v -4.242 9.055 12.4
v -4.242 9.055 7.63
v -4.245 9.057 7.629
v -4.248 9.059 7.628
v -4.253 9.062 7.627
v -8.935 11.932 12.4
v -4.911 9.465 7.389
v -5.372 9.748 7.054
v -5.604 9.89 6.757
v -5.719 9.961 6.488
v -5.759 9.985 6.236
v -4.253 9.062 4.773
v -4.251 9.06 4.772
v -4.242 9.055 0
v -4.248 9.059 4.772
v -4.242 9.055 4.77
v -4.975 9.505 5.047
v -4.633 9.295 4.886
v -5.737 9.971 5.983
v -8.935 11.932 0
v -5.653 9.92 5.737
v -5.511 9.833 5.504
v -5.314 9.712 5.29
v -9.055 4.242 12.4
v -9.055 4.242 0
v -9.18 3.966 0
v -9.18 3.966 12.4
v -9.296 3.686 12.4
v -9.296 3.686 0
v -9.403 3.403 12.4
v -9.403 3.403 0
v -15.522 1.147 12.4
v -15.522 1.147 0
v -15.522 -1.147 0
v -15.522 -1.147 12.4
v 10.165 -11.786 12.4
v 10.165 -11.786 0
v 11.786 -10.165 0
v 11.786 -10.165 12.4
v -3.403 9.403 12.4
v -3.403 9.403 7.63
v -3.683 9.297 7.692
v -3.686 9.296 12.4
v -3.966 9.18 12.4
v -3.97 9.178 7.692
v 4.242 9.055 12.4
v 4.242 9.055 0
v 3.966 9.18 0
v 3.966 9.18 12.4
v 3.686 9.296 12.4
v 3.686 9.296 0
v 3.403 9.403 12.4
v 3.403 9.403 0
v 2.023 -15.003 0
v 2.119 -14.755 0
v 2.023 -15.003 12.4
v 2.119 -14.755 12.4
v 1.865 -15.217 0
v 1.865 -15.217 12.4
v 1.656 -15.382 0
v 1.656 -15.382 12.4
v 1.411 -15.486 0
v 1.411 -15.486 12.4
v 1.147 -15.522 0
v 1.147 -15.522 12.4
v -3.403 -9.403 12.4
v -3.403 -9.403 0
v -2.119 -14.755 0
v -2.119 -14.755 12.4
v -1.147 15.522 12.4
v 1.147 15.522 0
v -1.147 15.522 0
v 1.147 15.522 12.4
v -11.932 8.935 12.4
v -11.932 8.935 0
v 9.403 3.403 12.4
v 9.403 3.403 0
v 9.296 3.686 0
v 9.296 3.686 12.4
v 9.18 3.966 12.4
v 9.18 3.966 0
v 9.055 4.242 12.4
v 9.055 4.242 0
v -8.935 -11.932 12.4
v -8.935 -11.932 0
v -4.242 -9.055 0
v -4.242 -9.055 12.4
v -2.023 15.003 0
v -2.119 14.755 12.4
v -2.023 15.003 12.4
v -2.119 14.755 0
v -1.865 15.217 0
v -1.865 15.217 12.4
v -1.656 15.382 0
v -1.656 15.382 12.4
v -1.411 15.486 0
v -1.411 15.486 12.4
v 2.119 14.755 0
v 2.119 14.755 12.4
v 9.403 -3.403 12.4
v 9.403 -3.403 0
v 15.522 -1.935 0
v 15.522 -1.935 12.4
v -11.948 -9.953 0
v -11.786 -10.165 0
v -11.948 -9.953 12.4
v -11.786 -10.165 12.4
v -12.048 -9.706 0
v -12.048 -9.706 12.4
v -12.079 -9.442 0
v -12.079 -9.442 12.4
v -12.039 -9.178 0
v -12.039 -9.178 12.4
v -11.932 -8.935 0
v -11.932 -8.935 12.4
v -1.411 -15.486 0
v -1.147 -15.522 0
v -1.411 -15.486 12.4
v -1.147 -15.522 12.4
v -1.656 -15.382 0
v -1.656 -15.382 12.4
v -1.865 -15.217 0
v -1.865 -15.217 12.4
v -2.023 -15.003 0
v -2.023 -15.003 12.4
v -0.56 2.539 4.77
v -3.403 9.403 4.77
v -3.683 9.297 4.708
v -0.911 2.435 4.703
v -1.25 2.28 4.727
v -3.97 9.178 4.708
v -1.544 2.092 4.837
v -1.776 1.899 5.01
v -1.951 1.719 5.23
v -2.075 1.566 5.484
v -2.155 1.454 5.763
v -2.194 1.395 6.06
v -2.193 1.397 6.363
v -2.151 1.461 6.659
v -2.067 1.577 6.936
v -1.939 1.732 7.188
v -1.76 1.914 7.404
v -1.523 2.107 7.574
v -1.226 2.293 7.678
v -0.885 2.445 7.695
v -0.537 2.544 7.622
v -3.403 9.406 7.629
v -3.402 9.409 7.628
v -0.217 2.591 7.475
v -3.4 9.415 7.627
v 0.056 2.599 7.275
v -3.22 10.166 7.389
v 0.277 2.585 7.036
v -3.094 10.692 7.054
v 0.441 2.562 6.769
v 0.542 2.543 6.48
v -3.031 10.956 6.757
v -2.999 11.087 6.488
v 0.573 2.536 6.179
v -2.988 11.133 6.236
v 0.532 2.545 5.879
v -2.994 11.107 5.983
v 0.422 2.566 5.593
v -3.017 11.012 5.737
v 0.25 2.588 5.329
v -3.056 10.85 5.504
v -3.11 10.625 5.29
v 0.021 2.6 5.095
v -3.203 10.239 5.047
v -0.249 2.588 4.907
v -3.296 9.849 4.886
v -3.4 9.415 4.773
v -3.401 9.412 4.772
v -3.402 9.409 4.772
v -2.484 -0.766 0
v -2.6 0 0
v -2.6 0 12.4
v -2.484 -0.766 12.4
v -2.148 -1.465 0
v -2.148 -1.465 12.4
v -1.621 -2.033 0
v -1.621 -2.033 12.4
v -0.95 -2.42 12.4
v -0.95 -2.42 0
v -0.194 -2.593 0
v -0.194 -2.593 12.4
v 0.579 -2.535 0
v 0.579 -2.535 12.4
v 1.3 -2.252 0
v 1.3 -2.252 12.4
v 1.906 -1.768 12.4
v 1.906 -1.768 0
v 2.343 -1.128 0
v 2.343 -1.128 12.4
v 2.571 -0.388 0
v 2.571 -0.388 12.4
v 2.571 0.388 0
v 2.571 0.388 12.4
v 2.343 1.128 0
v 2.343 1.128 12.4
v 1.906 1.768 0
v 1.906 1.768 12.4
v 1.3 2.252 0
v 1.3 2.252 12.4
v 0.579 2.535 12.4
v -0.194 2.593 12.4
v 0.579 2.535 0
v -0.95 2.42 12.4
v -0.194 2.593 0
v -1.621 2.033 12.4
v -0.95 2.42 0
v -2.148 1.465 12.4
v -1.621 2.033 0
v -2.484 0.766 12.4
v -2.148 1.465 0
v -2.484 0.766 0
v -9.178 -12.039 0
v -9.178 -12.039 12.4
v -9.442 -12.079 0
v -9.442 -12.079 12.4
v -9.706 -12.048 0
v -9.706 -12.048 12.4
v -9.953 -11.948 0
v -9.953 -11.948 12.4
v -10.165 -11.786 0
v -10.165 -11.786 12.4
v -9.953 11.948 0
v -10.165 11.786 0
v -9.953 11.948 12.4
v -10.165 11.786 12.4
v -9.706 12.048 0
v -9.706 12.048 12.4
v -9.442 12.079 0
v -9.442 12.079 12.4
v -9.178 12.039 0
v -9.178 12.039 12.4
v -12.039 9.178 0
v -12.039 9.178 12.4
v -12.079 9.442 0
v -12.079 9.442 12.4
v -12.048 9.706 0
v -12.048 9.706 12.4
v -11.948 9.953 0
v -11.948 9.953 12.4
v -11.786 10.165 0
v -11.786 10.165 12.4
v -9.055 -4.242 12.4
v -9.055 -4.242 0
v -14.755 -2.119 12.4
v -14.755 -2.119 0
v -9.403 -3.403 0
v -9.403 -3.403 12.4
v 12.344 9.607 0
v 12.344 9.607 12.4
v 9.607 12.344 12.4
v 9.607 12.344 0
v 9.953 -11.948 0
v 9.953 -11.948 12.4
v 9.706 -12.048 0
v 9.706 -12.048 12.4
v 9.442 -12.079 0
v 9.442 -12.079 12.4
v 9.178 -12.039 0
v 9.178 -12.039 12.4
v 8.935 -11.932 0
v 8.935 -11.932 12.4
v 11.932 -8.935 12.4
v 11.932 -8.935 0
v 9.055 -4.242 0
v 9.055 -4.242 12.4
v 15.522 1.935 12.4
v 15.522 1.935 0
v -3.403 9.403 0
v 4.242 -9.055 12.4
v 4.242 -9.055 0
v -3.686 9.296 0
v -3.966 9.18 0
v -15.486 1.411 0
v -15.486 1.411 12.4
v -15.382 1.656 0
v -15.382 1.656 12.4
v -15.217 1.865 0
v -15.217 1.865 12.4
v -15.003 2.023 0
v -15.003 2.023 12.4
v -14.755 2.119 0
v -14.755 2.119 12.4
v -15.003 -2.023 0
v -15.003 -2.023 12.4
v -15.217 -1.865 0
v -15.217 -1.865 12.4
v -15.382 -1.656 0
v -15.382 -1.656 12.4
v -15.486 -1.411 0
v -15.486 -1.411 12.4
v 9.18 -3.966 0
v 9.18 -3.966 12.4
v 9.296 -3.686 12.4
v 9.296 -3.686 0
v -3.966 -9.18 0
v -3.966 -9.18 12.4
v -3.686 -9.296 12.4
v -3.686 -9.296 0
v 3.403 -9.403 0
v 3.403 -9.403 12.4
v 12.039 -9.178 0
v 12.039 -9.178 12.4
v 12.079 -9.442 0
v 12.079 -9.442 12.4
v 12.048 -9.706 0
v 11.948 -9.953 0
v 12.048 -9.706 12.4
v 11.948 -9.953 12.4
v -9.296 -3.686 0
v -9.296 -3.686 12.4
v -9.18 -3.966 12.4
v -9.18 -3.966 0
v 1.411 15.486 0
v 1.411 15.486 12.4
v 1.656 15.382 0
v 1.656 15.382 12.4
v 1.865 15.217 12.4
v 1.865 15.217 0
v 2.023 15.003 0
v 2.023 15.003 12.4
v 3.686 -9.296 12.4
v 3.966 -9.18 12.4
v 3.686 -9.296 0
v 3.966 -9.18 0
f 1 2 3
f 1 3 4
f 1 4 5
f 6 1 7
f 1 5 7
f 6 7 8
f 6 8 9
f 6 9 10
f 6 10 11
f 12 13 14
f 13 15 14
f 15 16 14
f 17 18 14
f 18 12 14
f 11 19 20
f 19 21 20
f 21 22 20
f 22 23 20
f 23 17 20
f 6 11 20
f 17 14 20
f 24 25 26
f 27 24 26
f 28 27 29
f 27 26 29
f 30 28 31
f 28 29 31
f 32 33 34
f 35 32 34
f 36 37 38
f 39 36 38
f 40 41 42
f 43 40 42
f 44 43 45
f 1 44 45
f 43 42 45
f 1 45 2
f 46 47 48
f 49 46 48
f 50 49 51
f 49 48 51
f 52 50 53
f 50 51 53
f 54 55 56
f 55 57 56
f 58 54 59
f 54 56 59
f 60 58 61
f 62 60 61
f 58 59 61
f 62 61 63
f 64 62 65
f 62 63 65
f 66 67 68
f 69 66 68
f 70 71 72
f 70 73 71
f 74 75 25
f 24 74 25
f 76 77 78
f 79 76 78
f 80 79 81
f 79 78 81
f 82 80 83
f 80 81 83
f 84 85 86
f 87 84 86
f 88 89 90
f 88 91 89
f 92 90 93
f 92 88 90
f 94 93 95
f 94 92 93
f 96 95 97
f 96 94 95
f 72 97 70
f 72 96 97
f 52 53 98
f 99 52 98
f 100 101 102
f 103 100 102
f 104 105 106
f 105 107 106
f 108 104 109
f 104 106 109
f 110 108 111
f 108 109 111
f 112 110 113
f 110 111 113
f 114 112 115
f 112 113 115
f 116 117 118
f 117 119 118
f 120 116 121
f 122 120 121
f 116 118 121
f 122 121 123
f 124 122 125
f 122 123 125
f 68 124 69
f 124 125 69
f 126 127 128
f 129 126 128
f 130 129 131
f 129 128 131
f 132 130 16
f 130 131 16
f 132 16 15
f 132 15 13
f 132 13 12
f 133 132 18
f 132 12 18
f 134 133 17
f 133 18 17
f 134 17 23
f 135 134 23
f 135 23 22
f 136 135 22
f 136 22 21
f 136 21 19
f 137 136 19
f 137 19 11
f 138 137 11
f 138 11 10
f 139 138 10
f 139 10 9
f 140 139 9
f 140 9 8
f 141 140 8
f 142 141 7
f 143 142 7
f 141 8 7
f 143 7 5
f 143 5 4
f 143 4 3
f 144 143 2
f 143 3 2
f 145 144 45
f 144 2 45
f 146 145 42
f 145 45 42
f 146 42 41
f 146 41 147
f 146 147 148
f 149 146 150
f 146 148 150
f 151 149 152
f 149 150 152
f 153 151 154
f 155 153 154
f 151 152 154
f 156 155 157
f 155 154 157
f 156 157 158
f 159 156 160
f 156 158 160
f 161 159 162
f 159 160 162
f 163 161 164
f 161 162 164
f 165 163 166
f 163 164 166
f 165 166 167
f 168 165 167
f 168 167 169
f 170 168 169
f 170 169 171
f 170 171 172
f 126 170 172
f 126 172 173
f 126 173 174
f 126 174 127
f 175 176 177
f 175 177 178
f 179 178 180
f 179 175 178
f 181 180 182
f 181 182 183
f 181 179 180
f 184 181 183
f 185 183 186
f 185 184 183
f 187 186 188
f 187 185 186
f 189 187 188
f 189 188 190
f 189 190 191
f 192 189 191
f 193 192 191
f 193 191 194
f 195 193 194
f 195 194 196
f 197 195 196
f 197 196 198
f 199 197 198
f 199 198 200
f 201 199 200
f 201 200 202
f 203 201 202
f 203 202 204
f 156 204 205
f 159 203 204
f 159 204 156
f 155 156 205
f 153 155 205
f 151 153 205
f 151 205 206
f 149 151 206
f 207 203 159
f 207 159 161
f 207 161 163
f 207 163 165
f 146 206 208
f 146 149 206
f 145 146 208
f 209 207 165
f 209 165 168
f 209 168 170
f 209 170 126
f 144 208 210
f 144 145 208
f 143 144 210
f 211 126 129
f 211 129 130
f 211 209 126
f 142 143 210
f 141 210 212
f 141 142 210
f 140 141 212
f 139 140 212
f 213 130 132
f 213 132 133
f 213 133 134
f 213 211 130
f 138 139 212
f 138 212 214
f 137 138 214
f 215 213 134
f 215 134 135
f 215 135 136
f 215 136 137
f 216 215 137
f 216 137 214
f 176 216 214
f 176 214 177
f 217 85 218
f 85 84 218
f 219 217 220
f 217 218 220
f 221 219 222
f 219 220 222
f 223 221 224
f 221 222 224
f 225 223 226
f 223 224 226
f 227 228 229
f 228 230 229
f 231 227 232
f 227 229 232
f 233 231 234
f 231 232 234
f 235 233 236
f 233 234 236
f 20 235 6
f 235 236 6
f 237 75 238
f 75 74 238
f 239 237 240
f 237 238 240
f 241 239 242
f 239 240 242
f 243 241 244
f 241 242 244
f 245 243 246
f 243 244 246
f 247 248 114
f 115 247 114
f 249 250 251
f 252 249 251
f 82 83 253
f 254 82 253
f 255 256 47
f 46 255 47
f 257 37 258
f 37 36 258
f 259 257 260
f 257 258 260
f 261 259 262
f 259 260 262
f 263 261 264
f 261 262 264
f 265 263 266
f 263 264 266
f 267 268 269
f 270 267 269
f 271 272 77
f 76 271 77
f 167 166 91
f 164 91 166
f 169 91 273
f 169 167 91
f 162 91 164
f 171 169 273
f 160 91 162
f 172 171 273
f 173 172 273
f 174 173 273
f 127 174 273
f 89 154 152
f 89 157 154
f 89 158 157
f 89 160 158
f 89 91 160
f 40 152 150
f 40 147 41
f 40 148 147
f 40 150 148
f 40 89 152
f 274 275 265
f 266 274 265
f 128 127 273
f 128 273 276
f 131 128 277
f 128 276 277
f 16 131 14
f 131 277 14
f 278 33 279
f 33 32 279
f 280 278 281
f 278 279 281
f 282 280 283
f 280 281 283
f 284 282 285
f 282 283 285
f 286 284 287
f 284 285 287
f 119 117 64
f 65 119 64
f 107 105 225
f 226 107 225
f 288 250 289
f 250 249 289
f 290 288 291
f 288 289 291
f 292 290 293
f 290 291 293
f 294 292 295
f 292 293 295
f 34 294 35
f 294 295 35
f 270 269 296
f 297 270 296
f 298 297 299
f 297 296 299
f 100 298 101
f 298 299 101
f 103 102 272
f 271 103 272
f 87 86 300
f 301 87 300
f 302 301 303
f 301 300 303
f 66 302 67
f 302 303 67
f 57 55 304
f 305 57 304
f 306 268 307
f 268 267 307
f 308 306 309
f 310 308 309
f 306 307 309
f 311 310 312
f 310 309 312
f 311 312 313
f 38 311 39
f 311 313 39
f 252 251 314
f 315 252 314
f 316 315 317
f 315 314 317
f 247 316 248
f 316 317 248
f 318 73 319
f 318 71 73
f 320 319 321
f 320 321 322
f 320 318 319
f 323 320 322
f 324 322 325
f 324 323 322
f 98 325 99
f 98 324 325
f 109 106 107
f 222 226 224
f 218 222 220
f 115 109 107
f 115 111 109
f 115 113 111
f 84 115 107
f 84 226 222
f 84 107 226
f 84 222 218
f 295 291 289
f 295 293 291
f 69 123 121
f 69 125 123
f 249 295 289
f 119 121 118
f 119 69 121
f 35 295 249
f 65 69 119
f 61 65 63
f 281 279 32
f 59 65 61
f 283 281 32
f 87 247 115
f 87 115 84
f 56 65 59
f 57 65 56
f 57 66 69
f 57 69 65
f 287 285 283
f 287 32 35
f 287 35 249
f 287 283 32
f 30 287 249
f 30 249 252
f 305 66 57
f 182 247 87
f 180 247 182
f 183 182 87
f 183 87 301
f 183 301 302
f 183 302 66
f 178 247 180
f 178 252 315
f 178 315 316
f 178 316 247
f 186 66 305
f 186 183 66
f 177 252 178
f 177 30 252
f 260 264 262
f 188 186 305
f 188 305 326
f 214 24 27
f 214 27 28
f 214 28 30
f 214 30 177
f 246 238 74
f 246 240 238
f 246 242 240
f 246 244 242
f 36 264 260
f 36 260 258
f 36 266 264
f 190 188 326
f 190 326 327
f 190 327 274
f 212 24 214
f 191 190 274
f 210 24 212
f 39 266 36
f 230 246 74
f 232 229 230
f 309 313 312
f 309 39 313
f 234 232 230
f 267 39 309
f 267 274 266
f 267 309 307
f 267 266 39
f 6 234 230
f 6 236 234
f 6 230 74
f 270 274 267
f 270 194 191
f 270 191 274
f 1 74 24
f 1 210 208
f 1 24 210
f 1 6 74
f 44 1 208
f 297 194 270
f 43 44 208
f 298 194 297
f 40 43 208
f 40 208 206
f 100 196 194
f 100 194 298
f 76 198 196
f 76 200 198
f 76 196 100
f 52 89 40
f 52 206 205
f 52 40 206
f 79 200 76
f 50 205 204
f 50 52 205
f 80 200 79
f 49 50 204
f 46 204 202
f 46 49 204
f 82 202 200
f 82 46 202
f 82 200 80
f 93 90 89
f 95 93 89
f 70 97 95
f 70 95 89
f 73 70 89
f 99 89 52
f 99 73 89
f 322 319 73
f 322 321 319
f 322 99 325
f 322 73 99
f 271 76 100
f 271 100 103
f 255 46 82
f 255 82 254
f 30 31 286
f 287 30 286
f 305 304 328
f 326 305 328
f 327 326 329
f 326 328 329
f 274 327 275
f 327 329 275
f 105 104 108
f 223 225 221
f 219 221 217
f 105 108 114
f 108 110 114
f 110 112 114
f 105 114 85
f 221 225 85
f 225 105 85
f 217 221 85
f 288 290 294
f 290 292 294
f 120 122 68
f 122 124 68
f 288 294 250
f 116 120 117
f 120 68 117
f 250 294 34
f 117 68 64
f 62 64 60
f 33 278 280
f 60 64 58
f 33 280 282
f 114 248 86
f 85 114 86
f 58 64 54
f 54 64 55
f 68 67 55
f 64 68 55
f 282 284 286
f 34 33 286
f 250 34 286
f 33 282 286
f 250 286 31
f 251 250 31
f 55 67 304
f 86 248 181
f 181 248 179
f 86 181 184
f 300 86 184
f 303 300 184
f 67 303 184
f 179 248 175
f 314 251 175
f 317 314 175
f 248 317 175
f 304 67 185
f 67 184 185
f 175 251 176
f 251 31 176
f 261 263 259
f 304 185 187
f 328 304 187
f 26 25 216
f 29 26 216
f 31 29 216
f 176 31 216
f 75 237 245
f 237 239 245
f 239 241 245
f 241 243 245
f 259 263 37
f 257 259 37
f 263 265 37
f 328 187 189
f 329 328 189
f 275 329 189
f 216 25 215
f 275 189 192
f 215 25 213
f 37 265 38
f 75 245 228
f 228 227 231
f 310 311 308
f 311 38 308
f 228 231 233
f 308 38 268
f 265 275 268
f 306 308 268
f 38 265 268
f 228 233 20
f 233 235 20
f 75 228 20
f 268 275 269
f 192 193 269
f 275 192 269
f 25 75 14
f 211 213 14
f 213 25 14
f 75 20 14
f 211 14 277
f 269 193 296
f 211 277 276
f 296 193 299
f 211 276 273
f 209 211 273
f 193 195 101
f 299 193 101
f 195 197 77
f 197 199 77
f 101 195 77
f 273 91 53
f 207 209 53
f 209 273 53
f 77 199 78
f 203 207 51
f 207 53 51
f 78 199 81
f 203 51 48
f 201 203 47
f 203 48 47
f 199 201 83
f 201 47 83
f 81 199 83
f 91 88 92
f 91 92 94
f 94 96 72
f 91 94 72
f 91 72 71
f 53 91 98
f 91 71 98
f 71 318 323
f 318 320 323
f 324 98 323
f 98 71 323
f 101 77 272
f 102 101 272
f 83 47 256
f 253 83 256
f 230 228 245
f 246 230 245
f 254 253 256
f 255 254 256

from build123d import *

# Parameters (mm, degrees)
SKETCH1_R                      = 10
SKETCH1_R_2                    = 2.6
BOSS_EXTRUDE1_DEPTH            = 12.4
BOSS_EXTRUDE2_DEPTH            = 6.2
CIRPATTERN1_DEPTH              = 12.4
CUT_EXTRUDE1_REACH             = 35.782
CUT_EXTRUDE1_END_RADIUS        = 2.6
SKETCH5_R                      = 1.5
CUT_EXTRUDE1_DIRECTION_2_DEPTH = 4.1
FILLET4_R                      = 1


# Read off the part's stored shape, not the designer's step: CirPattern1
with BuildPart() as part:
    # Sketch1 → Boss-Extrude1 (new body)
    with BuildSketch(Plane.XY):
        with Locations(Location((0, 0, 0), (0, 0, 180))):
            Circle(SKETCH1_R)
        with Locations(Location((0, 0, 0), (0, 0, 180))):
            Circle(SKETCH1_R_2, mode=Mode.SUBTRACT)
    extrude(amount=BOSS_EXTRUDE1_DEPTH)

    # Sketch2 → Boss-Extrude2 (add, symmetric)
    with BuildSketch(Plane.XY.offset(6.2)):
        Polygon((-1.935099749, 15.52158862), (-3.5, 9), (3.5, 9), (1.935099749, 15.52158862), align=None)
    extrude(amount=BOSS_EXTRUDE2_DEPTH, both=True)

    # CirPattern1 outline → CirPattern1 (add)
    with BuildSketch(Plane.XY):
        with BuildLine():
            Line((-9.607098413, 12.343742723), (-12.343742723, 9.607098413))
            Line((-12.343742723, 9.607098413), (-9.055455951, 4.242489544))
            ThreePointArc((-9.055455951, 4.242489544), (-7.071067812, 7.071067812), (-4.242489544, 9.055455951))
            Line((-4.242489544, 9.055455951), (-9.607098413, 12.343742723))
        make_face()
        with BuildLine():
            ThreePointArc((4.242489544, 9.055455951), (7.071067812, 7.071067812), (9.055455951, 4.242489544))
            Line((9.055455951, 4.242489544), (12.343742723, 9.607098413))
            Line((12.343742723, 9.607098413), (9.607098413, 12.343742723))
            Line((9.607098413, 12.343742723), (4.242489544, 9.055455951))
        make_face()
        with BuildLine():
            ThreePointArc((9.403067435, 3.403281184), (10, 0), (9.403067435, -3.403281184))
            Line((9.403067435, -3.403281184), (15.52158862, -1.935099749))
            Line((15.52158862, -1.935099749), (15.52158862, 1.935099749))
            Line((15.52158862, 1.935099749), (9.403067435, 3.403281184))
        make_face()
        with BuildLine():
            ThreePointArc((9.055455951, -4.242489544), (7.071067812, -7.071067812), (4.242489544, -9.05545595))
            Line((4.242489544, -9.05545595), (9.607098413, -12.343742723))
            Line((9.607098413, -12.343742723), (12.343742723, -9.607098413))
            Line((12.343742723, -9.607098413), (9.055455951, -4.242489544))
        make_face()
        with BuildLine():
            ThreePointArc((3.403281184, -9.403067435), (0, -10), (-3.403281184, -9.403067435))
            Line((-3.403281184, -9.403067435), (-1.935099749, -15.52158862))
            Line((-1.935099749, -15.52158862), (1.935099749, -15.52158862))
            Line((1.935099749, -15.52158862), (3.403281184, -9.403067435))
        make_face()
        with BuildLine():
            ThreePointArc((-4.242489544, -9.05545595), (-7.071067812, -7.071067812), (-9.055455951, -4.242489544))
            Line((-9.055455951, -4.242489544), (-12.343742723, -9.607098413))
            Line((-12.343742723, -9.607098413), (-9.607098413, -12.343742723))
            Line((-9.607098413, -12.343742723), (-4.242489544, -9.05545595))
        make_face()
        with BuildLine():
            ThreePointArc((-9.403067435, -3.403281184), (-10, 0), (-9.403067435, 3.403281184))
            Line((-9.403067435, 3.403281184), (-15.52158862, 1.935099749))
            Line((-15.52158862, 1.935099749), (-15.52158862, -1.935099749))
            Line((-15.52158862, -1.935099749), (-9.403067435, -3.403281184))
        make_face()
    extrude(amount=CIRPATTERN1_DEPTH)

    # Cut-Extrude1: up to this cylinder (the profile starts outside it)
    cut_extrude1_end = Plane(origin=(0, 0, 6.2), z_dir=(0, 0, -1)) * Cylinder(CUT_EXTRUDE1_END_RADIUS, 77.764, mode=Mode.PRIVATE)
    # Sketch5 → Cut-Extrude1 (cut, up to the surface)
    with BuildSketch(Plane(origin=(-3.826834324, 9.238795325, 0), x_dir=(0.9238795325112892, 0.3826834323650838, 0), z_dir=(-0.3826834323650838, 0.9238795325112892, 0)), mode=Mode.PRIVATE) as cut_extrude1_sk1:
        with Locations(Location((0, -6.2, 0), (0, 0, 72.37509472))):
            Circle(SKETCH5_R)
    cut_extrude1_tool1 = extrude(cut_extrude1_sk1.sketch, amount=-CUT_EXTRUDE1_REACH, mode=Mode.PRIVATE) - cut_extrude1_end
    add(cut_extrude1_tool1.solids().sort_by_distance((-3.826834, 9.238795, 6.2))[0], mode=Mode.SUBTRACT)

    # Sketch5 → Cut-Extrude1 direction 2 (cut)
    with BuildSketch(Plane(origin=(-3.826834324, 9.238795325, 0), x_dir=(0.9238795325112892, 0.3826834323650838, 0), z_dir=(-0.3826834323650838, 0.9238795325112892, 0))):
        with Locations(Location((0, -6.2, 0), (0, 0, 72.37509472))):
            Circle(SKETCH5_R)
    extrude(amount=CUT_EXTRUDE1_DIRECTION_2_DEPTH, mode=Mode.SUBTRACT)

    # Fillet4
    fillet4_edges = [part.edges().sort_by_distance(p)[0] for p in [
        (9.607098413, -12.343742723, 6.2),
        (12.343742723, -9.607098413, 6.2),
        (1.935099749, 15.52158862, 6.2),
        (-1.935099749, 15.52158862, 6.2),
        (-9.607098413, 12.343742723, 6.2),
        (-12.343742723, 9.607098413, 6.2),
        (-15.52158862, 1.935099749, 6.2),
        (-15.52158862, -1.935099749, 6.2),
        (-12.343742723, -9.607098413, 6.2),
        (-9.607098413, -12.343742723, 6.2),
        (-1.935099749, -15.52158862, 6.2),
        (1.935099749, -15.52158862, 6.2),
    ]]
    fillet(fillet4_edges, radius=FILLET4_R)


solid = part.part
